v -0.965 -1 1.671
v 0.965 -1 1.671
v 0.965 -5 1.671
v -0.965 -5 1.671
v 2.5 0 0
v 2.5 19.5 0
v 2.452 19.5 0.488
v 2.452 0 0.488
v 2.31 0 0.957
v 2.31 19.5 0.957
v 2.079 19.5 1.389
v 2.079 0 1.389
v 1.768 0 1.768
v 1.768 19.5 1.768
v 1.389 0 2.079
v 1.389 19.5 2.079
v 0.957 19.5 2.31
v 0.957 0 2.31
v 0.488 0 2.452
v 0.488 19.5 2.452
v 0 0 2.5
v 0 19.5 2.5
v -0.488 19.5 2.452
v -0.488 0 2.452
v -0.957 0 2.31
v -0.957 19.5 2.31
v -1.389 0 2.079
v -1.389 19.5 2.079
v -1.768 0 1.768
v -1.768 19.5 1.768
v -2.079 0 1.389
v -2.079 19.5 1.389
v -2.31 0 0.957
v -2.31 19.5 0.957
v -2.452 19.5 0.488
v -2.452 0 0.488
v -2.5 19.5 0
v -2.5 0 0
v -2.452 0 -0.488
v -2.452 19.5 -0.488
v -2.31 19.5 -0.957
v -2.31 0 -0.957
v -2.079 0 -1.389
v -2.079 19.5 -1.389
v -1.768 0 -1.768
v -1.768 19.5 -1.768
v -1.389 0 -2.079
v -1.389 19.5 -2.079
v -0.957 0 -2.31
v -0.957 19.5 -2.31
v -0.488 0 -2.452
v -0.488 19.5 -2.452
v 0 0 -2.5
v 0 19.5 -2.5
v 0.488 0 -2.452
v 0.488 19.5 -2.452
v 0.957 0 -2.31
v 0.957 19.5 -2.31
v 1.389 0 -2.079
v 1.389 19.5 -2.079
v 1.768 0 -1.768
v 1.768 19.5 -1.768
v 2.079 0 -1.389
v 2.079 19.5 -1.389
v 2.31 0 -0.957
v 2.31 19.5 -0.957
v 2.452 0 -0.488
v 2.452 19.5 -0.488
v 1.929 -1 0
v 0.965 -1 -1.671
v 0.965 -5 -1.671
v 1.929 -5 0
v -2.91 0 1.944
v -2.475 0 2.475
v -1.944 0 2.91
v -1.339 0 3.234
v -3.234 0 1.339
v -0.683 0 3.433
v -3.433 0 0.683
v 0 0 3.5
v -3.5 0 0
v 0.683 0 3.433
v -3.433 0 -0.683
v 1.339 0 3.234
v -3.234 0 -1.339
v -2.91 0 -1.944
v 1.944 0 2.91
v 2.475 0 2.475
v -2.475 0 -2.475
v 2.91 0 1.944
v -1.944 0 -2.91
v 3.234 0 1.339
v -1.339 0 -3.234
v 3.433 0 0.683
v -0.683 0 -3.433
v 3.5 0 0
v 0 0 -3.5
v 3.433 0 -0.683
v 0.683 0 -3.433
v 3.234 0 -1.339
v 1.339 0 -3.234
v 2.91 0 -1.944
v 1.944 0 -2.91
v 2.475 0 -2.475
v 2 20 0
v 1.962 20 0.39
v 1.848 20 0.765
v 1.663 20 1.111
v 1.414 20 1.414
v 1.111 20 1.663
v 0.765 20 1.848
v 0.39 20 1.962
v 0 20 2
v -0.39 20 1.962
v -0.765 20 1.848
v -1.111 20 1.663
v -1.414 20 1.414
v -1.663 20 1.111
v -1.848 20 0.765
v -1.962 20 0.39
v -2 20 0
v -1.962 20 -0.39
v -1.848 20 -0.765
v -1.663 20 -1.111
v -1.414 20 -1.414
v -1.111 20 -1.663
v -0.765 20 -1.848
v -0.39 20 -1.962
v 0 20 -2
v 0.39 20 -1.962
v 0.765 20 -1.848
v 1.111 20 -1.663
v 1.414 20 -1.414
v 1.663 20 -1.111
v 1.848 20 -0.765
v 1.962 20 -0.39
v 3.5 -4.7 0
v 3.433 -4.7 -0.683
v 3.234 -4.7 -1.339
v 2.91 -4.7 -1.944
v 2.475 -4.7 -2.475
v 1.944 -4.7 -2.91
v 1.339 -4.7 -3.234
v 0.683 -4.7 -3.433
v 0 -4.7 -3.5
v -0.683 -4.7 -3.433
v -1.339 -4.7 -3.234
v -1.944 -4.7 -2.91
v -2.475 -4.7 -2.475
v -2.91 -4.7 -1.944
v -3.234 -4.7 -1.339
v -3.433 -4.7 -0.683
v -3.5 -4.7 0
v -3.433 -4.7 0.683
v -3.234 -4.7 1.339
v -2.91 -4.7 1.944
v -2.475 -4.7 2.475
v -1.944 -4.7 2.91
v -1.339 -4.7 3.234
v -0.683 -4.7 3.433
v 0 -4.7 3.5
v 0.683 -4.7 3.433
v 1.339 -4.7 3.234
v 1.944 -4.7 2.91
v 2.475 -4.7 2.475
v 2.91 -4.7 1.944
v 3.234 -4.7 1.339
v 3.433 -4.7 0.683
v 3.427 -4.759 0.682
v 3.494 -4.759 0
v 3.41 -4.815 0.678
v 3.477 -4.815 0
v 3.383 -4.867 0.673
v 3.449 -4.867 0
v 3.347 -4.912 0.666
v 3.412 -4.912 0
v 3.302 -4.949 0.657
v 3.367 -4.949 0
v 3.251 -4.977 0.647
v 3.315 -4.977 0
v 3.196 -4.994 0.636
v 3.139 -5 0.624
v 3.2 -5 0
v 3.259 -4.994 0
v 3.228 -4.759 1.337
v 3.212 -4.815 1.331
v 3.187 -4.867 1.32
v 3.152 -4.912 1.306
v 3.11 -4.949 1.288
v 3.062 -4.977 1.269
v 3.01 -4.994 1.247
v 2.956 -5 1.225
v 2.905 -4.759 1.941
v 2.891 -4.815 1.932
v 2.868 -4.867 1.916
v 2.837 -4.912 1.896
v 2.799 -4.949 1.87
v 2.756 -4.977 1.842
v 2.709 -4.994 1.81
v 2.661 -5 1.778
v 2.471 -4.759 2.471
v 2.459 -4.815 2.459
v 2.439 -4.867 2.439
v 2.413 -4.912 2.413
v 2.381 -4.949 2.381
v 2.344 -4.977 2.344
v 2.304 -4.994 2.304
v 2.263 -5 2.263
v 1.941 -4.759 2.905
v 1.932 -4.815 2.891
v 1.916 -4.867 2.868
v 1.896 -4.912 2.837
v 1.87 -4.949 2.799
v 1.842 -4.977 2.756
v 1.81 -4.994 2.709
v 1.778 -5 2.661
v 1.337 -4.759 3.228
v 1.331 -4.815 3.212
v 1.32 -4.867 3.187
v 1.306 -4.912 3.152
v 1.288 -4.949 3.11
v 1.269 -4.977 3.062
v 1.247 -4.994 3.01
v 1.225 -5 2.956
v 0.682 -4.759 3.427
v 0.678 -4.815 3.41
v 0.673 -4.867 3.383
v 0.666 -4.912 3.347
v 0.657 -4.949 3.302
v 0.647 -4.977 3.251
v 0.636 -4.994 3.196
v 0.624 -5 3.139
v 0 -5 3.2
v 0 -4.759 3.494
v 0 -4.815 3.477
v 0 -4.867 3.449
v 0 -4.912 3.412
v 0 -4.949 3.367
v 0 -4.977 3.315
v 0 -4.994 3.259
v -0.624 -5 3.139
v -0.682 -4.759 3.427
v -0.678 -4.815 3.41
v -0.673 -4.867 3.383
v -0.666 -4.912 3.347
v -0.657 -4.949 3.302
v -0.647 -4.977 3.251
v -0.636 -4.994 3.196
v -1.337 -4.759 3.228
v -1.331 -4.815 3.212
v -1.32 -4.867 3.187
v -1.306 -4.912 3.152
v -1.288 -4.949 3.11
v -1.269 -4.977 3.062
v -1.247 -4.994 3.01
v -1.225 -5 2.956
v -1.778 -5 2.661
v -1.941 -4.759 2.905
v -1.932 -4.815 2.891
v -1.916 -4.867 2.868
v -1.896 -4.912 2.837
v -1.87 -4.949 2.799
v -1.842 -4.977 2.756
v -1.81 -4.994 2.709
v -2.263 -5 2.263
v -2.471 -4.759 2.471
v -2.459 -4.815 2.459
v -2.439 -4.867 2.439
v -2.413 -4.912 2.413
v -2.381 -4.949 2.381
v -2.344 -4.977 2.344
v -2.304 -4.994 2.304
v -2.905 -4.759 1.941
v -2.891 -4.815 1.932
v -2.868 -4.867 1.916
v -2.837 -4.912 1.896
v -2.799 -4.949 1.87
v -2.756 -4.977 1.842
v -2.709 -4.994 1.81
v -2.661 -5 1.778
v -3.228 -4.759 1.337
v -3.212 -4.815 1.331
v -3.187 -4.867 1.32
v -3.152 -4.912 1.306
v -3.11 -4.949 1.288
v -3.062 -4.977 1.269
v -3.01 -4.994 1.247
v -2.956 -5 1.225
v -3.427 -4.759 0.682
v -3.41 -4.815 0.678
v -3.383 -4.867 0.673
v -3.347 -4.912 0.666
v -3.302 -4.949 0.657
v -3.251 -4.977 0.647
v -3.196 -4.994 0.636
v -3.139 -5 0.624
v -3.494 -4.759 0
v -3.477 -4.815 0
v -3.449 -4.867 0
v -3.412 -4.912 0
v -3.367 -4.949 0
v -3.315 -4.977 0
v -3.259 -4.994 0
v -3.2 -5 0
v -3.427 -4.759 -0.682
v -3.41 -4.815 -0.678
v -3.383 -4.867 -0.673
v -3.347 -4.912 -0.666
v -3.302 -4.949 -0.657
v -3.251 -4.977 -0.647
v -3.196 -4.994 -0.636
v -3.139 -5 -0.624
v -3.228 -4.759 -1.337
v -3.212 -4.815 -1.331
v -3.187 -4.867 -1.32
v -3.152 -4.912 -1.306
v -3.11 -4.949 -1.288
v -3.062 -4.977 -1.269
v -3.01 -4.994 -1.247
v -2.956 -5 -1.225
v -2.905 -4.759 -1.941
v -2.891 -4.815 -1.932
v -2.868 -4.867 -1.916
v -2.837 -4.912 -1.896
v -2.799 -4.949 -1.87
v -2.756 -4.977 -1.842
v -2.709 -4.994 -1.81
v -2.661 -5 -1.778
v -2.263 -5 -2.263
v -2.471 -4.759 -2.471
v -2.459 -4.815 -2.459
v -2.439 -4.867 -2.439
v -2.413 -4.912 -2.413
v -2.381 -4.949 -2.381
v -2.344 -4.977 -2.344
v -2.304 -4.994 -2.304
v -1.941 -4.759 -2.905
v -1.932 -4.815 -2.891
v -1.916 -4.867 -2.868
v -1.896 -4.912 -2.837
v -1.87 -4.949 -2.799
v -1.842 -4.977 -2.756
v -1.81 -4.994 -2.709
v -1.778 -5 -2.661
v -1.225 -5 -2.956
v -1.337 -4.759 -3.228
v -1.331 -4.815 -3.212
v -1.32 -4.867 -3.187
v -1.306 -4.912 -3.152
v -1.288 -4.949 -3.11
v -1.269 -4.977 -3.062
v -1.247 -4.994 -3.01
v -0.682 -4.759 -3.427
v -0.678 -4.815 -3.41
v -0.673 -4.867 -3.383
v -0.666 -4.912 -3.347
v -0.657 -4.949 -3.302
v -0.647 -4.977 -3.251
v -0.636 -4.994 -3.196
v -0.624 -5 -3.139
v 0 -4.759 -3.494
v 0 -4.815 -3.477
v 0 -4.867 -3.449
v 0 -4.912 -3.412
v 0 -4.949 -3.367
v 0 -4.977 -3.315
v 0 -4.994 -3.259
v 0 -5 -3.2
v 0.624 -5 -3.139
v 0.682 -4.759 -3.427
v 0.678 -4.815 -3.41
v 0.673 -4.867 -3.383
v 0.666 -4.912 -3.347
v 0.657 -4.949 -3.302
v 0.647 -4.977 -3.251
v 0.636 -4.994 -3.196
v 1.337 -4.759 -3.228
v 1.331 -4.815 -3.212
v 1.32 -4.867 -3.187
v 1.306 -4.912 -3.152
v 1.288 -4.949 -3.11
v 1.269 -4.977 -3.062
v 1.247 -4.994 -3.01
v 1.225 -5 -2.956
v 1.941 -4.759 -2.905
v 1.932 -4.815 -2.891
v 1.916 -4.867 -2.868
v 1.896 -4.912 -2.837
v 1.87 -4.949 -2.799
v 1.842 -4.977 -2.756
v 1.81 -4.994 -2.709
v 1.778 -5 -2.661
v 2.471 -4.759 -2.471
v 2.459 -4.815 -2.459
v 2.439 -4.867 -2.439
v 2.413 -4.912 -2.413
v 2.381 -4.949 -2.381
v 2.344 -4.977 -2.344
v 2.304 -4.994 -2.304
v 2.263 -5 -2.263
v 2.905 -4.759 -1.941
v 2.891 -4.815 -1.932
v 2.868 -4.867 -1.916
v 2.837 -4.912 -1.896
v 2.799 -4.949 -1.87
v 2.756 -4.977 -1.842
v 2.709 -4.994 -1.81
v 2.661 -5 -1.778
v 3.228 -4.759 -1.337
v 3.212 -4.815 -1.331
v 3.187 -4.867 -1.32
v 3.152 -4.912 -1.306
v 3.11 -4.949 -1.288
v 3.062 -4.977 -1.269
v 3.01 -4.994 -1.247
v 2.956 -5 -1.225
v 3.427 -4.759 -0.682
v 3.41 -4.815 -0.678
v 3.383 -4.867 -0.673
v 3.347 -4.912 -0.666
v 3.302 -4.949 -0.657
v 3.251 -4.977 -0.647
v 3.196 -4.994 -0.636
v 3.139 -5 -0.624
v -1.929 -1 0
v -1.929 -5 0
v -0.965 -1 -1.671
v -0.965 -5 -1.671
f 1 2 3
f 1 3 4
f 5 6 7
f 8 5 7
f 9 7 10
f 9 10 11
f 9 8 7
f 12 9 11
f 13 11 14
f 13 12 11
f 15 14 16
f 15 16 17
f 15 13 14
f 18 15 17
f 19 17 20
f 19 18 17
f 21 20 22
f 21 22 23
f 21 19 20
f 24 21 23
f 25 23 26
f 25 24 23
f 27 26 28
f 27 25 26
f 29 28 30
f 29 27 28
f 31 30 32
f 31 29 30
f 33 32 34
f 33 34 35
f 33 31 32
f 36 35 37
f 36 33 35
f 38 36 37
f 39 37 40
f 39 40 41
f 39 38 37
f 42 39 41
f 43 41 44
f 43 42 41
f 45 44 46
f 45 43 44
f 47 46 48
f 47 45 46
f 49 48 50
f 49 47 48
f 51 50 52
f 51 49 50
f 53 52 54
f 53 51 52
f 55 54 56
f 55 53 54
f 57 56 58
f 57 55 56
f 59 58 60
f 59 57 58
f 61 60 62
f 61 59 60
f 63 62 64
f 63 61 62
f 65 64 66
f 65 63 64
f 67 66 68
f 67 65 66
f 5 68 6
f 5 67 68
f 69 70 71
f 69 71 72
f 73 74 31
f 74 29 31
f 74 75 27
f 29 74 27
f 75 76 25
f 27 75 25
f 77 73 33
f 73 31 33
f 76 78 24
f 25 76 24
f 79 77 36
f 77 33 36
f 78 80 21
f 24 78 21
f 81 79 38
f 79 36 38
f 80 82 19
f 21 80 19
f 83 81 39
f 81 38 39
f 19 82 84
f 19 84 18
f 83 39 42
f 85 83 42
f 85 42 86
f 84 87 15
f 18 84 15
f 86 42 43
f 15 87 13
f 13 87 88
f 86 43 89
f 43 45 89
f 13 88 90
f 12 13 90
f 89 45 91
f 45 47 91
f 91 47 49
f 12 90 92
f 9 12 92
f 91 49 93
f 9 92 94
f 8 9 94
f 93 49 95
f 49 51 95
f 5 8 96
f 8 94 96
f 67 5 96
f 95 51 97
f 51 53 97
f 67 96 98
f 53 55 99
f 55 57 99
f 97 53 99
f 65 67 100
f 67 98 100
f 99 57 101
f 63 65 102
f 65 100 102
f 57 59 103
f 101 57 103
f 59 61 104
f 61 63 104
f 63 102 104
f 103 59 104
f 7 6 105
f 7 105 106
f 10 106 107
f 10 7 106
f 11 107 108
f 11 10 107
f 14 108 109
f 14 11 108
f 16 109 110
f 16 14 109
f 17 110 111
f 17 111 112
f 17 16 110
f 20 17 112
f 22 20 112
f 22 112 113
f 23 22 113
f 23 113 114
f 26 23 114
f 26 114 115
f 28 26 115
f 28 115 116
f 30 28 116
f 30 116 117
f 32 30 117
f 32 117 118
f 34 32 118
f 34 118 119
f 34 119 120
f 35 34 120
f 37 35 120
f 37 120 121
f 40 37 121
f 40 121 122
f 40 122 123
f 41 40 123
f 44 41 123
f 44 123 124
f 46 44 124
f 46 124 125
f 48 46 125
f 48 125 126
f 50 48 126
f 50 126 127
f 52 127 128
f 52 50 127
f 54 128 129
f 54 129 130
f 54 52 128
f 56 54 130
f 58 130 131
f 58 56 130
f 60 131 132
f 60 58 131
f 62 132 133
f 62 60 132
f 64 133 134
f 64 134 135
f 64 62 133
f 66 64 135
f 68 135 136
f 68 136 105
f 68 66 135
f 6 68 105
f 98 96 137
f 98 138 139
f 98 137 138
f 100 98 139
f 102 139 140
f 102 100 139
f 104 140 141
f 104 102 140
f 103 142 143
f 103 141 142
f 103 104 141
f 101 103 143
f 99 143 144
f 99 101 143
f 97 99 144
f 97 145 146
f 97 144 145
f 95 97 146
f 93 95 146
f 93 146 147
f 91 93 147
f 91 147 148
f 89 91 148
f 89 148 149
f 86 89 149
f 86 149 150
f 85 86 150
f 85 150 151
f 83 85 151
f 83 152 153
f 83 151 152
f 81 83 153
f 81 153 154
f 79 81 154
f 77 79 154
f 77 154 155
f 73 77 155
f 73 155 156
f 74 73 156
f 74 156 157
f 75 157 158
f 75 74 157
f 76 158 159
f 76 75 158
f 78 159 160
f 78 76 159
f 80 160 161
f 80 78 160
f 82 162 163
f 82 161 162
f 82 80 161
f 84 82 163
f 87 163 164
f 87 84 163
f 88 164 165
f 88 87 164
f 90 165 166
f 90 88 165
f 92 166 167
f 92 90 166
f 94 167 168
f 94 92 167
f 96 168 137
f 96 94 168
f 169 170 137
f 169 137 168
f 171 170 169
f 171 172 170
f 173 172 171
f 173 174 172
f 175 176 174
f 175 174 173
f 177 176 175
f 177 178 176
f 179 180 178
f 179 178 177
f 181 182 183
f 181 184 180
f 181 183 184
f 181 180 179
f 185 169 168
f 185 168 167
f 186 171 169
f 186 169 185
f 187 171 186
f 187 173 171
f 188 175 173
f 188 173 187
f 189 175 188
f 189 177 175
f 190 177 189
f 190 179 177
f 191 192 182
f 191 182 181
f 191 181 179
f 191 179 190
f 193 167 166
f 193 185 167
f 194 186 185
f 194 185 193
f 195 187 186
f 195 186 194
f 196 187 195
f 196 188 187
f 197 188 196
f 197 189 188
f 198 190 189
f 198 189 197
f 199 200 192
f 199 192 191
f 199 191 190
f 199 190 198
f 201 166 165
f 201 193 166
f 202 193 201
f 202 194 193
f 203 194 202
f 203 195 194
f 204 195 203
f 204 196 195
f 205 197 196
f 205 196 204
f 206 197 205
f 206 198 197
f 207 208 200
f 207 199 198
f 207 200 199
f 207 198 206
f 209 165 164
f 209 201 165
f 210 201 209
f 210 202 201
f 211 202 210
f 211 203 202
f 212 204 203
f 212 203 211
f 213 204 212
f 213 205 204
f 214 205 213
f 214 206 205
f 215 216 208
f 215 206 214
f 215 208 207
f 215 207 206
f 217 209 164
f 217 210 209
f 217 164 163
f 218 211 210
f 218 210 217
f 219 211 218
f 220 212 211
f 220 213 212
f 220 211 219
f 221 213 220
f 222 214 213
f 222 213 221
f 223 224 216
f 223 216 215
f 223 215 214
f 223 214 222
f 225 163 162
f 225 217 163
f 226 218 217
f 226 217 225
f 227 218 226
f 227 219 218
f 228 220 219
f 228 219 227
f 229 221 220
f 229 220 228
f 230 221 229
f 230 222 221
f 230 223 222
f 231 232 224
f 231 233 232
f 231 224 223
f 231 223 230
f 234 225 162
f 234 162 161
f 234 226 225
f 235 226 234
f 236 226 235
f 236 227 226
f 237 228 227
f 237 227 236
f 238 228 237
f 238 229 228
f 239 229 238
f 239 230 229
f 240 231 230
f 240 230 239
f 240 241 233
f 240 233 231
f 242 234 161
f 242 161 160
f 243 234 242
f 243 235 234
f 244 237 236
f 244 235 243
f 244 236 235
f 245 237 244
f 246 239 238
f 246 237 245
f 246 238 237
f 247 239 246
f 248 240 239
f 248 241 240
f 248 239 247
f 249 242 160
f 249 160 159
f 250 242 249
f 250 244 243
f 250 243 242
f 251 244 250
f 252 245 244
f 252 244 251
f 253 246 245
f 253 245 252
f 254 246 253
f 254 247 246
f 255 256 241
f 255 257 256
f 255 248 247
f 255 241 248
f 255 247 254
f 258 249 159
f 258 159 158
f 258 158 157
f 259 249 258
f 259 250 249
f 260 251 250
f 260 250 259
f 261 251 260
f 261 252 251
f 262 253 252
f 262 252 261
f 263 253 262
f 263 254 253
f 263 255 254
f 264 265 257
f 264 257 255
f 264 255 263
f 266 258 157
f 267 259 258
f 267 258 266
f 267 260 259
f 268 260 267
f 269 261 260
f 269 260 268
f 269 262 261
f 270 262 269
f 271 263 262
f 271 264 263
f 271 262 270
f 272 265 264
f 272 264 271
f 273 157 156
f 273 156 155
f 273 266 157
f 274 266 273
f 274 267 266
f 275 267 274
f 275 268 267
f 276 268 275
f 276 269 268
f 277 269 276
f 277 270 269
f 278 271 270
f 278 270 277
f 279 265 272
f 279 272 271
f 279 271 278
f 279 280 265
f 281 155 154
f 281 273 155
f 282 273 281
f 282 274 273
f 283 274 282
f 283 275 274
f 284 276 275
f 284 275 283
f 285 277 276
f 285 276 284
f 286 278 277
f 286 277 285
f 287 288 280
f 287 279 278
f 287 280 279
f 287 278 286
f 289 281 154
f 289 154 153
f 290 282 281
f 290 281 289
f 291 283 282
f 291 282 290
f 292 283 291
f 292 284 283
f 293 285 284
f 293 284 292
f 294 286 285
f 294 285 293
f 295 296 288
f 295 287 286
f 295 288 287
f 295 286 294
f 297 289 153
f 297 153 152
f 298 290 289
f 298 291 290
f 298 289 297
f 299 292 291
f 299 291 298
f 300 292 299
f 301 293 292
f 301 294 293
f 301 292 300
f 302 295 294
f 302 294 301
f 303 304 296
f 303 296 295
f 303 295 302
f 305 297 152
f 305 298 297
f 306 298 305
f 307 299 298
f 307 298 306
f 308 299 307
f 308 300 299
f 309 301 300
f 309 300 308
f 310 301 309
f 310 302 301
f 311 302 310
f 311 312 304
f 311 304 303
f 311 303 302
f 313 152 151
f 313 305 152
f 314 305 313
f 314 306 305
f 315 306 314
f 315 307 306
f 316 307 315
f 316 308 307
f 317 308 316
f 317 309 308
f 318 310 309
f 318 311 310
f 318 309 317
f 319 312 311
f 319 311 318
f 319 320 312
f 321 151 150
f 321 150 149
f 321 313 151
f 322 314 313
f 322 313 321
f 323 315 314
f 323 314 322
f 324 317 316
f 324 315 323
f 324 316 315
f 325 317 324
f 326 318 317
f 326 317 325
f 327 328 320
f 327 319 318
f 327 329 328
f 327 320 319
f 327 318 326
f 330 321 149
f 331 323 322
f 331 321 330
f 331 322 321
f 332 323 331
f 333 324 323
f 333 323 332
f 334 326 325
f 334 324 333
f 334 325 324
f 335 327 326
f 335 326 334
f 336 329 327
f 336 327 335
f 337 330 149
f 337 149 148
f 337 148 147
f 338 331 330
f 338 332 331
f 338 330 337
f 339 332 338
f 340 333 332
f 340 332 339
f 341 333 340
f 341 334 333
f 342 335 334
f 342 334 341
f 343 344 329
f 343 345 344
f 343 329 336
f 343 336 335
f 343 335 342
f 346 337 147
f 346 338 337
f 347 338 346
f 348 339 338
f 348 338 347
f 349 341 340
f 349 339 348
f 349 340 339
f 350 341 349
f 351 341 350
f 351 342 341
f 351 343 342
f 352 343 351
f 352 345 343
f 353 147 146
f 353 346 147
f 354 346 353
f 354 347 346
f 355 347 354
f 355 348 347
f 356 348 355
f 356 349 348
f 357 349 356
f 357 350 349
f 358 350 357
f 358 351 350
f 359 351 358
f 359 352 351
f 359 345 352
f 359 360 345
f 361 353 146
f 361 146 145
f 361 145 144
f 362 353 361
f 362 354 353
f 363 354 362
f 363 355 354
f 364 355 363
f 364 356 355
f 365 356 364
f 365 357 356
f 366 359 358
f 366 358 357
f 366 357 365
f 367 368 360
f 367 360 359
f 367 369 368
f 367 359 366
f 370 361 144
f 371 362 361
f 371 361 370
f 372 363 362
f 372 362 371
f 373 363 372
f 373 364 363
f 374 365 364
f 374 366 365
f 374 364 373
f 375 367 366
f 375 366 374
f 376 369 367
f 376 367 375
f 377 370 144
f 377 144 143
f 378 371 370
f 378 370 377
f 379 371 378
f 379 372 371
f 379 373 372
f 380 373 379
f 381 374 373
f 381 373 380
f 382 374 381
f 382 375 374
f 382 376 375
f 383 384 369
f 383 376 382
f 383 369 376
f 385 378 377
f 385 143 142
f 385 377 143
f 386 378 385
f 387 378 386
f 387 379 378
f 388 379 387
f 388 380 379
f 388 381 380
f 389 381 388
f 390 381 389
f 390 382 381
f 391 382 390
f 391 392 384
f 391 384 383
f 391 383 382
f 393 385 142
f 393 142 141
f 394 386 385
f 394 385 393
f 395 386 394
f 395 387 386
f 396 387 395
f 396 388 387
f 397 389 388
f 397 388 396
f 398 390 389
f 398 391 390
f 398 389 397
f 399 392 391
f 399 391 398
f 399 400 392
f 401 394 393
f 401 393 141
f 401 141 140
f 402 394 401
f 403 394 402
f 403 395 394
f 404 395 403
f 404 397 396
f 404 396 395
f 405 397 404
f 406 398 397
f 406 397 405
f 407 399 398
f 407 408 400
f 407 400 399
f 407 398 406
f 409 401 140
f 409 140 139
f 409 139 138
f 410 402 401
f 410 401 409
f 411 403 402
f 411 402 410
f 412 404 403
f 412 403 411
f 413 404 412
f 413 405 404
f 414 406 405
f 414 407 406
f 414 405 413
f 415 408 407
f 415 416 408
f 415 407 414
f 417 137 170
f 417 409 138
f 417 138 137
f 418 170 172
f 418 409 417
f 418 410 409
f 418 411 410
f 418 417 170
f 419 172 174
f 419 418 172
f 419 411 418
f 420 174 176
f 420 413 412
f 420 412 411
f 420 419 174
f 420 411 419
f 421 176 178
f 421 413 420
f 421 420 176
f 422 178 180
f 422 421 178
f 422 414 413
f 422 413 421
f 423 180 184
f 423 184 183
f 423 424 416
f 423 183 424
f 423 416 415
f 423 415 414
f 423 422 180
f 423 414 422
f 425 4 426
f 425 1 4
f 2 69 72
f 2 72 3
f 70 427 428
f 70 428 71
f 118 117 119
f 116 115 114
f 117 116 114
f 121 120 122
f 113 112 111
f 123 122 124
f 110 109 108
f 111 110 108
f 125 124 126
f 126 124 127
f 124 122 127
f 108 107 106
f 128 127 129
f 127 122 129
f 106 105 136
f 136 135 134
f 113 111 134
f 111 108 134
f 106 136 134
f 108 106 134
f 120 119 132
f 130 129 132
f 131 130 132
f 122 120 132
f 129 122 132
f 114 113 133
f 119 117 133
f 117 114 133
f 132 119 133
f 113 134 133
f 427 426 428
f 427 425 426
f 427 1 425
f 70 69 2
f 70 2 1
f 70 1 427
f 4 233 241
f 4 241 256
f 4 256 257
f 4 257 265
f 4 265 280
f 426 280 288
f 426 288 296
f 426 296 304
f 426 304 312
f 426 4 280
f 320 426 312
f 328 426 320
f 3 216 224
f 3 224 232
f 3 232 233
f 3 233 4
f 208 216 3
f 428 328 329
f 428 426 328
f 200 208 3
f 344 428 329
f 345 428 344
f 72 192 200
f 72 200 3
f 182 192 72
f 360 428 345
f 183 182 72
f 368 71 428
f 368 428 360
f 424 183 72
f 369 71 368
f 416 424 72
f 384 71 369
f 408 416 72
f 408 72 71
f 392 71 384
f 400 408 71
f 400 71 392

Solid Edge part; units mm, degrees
sketch "Sketch1" plane through (0, 0, 0) normal (0, -1, 0) x (1, 0, 0)
  circle A0 centre (0, 0) radius 2.5
extrude "Protrusion1" add sketch "Sketch1" against normal blind 20
sketch "Sketch2" plane through (0, 0, 0) normal (0, -1, 0) x (1, 0, 0)
  circle A0 centre (0, 0) radius 3.5
extrude "ExtrudedProtrusion_2" add sketch "Sketch2" along normal blind 5
fillet "Round_1" radius 0.3 1 edges at (-3.5, -5, 0)
chamfer "Chamfer_1" distance 0.5 angle 45 1 edges at (-2.5, 20, 0) measured on face at (-1.6167, 20, 1.7167)
sketch "Sketch3" plane through (0, -5, 0) normal (0, -1, 0) x (1, 0, 0)
  line L0 (-0.9646, 1.6708) -> (-1.9293, 0)
  line L1 (-1.9293, 0) -> (-0.9646, -1.6708)
  line L2 (-0.9646, -1.6708) -> (0.9646, -1.6708)
  line L3 (0.9646, -1.6708) -> (1.9293, 0)
  line L4 (1.9293, 0) -> (0.9646, 1.6708)
  line L5 (0.9646, 1.6708) -> (-0.9646, 1.6708)
extrude "ExtrudedCutout_1" cut sketch "Sketch3" along normal mid plane 8
cosmetic_thread "Thread1" size "M5"
